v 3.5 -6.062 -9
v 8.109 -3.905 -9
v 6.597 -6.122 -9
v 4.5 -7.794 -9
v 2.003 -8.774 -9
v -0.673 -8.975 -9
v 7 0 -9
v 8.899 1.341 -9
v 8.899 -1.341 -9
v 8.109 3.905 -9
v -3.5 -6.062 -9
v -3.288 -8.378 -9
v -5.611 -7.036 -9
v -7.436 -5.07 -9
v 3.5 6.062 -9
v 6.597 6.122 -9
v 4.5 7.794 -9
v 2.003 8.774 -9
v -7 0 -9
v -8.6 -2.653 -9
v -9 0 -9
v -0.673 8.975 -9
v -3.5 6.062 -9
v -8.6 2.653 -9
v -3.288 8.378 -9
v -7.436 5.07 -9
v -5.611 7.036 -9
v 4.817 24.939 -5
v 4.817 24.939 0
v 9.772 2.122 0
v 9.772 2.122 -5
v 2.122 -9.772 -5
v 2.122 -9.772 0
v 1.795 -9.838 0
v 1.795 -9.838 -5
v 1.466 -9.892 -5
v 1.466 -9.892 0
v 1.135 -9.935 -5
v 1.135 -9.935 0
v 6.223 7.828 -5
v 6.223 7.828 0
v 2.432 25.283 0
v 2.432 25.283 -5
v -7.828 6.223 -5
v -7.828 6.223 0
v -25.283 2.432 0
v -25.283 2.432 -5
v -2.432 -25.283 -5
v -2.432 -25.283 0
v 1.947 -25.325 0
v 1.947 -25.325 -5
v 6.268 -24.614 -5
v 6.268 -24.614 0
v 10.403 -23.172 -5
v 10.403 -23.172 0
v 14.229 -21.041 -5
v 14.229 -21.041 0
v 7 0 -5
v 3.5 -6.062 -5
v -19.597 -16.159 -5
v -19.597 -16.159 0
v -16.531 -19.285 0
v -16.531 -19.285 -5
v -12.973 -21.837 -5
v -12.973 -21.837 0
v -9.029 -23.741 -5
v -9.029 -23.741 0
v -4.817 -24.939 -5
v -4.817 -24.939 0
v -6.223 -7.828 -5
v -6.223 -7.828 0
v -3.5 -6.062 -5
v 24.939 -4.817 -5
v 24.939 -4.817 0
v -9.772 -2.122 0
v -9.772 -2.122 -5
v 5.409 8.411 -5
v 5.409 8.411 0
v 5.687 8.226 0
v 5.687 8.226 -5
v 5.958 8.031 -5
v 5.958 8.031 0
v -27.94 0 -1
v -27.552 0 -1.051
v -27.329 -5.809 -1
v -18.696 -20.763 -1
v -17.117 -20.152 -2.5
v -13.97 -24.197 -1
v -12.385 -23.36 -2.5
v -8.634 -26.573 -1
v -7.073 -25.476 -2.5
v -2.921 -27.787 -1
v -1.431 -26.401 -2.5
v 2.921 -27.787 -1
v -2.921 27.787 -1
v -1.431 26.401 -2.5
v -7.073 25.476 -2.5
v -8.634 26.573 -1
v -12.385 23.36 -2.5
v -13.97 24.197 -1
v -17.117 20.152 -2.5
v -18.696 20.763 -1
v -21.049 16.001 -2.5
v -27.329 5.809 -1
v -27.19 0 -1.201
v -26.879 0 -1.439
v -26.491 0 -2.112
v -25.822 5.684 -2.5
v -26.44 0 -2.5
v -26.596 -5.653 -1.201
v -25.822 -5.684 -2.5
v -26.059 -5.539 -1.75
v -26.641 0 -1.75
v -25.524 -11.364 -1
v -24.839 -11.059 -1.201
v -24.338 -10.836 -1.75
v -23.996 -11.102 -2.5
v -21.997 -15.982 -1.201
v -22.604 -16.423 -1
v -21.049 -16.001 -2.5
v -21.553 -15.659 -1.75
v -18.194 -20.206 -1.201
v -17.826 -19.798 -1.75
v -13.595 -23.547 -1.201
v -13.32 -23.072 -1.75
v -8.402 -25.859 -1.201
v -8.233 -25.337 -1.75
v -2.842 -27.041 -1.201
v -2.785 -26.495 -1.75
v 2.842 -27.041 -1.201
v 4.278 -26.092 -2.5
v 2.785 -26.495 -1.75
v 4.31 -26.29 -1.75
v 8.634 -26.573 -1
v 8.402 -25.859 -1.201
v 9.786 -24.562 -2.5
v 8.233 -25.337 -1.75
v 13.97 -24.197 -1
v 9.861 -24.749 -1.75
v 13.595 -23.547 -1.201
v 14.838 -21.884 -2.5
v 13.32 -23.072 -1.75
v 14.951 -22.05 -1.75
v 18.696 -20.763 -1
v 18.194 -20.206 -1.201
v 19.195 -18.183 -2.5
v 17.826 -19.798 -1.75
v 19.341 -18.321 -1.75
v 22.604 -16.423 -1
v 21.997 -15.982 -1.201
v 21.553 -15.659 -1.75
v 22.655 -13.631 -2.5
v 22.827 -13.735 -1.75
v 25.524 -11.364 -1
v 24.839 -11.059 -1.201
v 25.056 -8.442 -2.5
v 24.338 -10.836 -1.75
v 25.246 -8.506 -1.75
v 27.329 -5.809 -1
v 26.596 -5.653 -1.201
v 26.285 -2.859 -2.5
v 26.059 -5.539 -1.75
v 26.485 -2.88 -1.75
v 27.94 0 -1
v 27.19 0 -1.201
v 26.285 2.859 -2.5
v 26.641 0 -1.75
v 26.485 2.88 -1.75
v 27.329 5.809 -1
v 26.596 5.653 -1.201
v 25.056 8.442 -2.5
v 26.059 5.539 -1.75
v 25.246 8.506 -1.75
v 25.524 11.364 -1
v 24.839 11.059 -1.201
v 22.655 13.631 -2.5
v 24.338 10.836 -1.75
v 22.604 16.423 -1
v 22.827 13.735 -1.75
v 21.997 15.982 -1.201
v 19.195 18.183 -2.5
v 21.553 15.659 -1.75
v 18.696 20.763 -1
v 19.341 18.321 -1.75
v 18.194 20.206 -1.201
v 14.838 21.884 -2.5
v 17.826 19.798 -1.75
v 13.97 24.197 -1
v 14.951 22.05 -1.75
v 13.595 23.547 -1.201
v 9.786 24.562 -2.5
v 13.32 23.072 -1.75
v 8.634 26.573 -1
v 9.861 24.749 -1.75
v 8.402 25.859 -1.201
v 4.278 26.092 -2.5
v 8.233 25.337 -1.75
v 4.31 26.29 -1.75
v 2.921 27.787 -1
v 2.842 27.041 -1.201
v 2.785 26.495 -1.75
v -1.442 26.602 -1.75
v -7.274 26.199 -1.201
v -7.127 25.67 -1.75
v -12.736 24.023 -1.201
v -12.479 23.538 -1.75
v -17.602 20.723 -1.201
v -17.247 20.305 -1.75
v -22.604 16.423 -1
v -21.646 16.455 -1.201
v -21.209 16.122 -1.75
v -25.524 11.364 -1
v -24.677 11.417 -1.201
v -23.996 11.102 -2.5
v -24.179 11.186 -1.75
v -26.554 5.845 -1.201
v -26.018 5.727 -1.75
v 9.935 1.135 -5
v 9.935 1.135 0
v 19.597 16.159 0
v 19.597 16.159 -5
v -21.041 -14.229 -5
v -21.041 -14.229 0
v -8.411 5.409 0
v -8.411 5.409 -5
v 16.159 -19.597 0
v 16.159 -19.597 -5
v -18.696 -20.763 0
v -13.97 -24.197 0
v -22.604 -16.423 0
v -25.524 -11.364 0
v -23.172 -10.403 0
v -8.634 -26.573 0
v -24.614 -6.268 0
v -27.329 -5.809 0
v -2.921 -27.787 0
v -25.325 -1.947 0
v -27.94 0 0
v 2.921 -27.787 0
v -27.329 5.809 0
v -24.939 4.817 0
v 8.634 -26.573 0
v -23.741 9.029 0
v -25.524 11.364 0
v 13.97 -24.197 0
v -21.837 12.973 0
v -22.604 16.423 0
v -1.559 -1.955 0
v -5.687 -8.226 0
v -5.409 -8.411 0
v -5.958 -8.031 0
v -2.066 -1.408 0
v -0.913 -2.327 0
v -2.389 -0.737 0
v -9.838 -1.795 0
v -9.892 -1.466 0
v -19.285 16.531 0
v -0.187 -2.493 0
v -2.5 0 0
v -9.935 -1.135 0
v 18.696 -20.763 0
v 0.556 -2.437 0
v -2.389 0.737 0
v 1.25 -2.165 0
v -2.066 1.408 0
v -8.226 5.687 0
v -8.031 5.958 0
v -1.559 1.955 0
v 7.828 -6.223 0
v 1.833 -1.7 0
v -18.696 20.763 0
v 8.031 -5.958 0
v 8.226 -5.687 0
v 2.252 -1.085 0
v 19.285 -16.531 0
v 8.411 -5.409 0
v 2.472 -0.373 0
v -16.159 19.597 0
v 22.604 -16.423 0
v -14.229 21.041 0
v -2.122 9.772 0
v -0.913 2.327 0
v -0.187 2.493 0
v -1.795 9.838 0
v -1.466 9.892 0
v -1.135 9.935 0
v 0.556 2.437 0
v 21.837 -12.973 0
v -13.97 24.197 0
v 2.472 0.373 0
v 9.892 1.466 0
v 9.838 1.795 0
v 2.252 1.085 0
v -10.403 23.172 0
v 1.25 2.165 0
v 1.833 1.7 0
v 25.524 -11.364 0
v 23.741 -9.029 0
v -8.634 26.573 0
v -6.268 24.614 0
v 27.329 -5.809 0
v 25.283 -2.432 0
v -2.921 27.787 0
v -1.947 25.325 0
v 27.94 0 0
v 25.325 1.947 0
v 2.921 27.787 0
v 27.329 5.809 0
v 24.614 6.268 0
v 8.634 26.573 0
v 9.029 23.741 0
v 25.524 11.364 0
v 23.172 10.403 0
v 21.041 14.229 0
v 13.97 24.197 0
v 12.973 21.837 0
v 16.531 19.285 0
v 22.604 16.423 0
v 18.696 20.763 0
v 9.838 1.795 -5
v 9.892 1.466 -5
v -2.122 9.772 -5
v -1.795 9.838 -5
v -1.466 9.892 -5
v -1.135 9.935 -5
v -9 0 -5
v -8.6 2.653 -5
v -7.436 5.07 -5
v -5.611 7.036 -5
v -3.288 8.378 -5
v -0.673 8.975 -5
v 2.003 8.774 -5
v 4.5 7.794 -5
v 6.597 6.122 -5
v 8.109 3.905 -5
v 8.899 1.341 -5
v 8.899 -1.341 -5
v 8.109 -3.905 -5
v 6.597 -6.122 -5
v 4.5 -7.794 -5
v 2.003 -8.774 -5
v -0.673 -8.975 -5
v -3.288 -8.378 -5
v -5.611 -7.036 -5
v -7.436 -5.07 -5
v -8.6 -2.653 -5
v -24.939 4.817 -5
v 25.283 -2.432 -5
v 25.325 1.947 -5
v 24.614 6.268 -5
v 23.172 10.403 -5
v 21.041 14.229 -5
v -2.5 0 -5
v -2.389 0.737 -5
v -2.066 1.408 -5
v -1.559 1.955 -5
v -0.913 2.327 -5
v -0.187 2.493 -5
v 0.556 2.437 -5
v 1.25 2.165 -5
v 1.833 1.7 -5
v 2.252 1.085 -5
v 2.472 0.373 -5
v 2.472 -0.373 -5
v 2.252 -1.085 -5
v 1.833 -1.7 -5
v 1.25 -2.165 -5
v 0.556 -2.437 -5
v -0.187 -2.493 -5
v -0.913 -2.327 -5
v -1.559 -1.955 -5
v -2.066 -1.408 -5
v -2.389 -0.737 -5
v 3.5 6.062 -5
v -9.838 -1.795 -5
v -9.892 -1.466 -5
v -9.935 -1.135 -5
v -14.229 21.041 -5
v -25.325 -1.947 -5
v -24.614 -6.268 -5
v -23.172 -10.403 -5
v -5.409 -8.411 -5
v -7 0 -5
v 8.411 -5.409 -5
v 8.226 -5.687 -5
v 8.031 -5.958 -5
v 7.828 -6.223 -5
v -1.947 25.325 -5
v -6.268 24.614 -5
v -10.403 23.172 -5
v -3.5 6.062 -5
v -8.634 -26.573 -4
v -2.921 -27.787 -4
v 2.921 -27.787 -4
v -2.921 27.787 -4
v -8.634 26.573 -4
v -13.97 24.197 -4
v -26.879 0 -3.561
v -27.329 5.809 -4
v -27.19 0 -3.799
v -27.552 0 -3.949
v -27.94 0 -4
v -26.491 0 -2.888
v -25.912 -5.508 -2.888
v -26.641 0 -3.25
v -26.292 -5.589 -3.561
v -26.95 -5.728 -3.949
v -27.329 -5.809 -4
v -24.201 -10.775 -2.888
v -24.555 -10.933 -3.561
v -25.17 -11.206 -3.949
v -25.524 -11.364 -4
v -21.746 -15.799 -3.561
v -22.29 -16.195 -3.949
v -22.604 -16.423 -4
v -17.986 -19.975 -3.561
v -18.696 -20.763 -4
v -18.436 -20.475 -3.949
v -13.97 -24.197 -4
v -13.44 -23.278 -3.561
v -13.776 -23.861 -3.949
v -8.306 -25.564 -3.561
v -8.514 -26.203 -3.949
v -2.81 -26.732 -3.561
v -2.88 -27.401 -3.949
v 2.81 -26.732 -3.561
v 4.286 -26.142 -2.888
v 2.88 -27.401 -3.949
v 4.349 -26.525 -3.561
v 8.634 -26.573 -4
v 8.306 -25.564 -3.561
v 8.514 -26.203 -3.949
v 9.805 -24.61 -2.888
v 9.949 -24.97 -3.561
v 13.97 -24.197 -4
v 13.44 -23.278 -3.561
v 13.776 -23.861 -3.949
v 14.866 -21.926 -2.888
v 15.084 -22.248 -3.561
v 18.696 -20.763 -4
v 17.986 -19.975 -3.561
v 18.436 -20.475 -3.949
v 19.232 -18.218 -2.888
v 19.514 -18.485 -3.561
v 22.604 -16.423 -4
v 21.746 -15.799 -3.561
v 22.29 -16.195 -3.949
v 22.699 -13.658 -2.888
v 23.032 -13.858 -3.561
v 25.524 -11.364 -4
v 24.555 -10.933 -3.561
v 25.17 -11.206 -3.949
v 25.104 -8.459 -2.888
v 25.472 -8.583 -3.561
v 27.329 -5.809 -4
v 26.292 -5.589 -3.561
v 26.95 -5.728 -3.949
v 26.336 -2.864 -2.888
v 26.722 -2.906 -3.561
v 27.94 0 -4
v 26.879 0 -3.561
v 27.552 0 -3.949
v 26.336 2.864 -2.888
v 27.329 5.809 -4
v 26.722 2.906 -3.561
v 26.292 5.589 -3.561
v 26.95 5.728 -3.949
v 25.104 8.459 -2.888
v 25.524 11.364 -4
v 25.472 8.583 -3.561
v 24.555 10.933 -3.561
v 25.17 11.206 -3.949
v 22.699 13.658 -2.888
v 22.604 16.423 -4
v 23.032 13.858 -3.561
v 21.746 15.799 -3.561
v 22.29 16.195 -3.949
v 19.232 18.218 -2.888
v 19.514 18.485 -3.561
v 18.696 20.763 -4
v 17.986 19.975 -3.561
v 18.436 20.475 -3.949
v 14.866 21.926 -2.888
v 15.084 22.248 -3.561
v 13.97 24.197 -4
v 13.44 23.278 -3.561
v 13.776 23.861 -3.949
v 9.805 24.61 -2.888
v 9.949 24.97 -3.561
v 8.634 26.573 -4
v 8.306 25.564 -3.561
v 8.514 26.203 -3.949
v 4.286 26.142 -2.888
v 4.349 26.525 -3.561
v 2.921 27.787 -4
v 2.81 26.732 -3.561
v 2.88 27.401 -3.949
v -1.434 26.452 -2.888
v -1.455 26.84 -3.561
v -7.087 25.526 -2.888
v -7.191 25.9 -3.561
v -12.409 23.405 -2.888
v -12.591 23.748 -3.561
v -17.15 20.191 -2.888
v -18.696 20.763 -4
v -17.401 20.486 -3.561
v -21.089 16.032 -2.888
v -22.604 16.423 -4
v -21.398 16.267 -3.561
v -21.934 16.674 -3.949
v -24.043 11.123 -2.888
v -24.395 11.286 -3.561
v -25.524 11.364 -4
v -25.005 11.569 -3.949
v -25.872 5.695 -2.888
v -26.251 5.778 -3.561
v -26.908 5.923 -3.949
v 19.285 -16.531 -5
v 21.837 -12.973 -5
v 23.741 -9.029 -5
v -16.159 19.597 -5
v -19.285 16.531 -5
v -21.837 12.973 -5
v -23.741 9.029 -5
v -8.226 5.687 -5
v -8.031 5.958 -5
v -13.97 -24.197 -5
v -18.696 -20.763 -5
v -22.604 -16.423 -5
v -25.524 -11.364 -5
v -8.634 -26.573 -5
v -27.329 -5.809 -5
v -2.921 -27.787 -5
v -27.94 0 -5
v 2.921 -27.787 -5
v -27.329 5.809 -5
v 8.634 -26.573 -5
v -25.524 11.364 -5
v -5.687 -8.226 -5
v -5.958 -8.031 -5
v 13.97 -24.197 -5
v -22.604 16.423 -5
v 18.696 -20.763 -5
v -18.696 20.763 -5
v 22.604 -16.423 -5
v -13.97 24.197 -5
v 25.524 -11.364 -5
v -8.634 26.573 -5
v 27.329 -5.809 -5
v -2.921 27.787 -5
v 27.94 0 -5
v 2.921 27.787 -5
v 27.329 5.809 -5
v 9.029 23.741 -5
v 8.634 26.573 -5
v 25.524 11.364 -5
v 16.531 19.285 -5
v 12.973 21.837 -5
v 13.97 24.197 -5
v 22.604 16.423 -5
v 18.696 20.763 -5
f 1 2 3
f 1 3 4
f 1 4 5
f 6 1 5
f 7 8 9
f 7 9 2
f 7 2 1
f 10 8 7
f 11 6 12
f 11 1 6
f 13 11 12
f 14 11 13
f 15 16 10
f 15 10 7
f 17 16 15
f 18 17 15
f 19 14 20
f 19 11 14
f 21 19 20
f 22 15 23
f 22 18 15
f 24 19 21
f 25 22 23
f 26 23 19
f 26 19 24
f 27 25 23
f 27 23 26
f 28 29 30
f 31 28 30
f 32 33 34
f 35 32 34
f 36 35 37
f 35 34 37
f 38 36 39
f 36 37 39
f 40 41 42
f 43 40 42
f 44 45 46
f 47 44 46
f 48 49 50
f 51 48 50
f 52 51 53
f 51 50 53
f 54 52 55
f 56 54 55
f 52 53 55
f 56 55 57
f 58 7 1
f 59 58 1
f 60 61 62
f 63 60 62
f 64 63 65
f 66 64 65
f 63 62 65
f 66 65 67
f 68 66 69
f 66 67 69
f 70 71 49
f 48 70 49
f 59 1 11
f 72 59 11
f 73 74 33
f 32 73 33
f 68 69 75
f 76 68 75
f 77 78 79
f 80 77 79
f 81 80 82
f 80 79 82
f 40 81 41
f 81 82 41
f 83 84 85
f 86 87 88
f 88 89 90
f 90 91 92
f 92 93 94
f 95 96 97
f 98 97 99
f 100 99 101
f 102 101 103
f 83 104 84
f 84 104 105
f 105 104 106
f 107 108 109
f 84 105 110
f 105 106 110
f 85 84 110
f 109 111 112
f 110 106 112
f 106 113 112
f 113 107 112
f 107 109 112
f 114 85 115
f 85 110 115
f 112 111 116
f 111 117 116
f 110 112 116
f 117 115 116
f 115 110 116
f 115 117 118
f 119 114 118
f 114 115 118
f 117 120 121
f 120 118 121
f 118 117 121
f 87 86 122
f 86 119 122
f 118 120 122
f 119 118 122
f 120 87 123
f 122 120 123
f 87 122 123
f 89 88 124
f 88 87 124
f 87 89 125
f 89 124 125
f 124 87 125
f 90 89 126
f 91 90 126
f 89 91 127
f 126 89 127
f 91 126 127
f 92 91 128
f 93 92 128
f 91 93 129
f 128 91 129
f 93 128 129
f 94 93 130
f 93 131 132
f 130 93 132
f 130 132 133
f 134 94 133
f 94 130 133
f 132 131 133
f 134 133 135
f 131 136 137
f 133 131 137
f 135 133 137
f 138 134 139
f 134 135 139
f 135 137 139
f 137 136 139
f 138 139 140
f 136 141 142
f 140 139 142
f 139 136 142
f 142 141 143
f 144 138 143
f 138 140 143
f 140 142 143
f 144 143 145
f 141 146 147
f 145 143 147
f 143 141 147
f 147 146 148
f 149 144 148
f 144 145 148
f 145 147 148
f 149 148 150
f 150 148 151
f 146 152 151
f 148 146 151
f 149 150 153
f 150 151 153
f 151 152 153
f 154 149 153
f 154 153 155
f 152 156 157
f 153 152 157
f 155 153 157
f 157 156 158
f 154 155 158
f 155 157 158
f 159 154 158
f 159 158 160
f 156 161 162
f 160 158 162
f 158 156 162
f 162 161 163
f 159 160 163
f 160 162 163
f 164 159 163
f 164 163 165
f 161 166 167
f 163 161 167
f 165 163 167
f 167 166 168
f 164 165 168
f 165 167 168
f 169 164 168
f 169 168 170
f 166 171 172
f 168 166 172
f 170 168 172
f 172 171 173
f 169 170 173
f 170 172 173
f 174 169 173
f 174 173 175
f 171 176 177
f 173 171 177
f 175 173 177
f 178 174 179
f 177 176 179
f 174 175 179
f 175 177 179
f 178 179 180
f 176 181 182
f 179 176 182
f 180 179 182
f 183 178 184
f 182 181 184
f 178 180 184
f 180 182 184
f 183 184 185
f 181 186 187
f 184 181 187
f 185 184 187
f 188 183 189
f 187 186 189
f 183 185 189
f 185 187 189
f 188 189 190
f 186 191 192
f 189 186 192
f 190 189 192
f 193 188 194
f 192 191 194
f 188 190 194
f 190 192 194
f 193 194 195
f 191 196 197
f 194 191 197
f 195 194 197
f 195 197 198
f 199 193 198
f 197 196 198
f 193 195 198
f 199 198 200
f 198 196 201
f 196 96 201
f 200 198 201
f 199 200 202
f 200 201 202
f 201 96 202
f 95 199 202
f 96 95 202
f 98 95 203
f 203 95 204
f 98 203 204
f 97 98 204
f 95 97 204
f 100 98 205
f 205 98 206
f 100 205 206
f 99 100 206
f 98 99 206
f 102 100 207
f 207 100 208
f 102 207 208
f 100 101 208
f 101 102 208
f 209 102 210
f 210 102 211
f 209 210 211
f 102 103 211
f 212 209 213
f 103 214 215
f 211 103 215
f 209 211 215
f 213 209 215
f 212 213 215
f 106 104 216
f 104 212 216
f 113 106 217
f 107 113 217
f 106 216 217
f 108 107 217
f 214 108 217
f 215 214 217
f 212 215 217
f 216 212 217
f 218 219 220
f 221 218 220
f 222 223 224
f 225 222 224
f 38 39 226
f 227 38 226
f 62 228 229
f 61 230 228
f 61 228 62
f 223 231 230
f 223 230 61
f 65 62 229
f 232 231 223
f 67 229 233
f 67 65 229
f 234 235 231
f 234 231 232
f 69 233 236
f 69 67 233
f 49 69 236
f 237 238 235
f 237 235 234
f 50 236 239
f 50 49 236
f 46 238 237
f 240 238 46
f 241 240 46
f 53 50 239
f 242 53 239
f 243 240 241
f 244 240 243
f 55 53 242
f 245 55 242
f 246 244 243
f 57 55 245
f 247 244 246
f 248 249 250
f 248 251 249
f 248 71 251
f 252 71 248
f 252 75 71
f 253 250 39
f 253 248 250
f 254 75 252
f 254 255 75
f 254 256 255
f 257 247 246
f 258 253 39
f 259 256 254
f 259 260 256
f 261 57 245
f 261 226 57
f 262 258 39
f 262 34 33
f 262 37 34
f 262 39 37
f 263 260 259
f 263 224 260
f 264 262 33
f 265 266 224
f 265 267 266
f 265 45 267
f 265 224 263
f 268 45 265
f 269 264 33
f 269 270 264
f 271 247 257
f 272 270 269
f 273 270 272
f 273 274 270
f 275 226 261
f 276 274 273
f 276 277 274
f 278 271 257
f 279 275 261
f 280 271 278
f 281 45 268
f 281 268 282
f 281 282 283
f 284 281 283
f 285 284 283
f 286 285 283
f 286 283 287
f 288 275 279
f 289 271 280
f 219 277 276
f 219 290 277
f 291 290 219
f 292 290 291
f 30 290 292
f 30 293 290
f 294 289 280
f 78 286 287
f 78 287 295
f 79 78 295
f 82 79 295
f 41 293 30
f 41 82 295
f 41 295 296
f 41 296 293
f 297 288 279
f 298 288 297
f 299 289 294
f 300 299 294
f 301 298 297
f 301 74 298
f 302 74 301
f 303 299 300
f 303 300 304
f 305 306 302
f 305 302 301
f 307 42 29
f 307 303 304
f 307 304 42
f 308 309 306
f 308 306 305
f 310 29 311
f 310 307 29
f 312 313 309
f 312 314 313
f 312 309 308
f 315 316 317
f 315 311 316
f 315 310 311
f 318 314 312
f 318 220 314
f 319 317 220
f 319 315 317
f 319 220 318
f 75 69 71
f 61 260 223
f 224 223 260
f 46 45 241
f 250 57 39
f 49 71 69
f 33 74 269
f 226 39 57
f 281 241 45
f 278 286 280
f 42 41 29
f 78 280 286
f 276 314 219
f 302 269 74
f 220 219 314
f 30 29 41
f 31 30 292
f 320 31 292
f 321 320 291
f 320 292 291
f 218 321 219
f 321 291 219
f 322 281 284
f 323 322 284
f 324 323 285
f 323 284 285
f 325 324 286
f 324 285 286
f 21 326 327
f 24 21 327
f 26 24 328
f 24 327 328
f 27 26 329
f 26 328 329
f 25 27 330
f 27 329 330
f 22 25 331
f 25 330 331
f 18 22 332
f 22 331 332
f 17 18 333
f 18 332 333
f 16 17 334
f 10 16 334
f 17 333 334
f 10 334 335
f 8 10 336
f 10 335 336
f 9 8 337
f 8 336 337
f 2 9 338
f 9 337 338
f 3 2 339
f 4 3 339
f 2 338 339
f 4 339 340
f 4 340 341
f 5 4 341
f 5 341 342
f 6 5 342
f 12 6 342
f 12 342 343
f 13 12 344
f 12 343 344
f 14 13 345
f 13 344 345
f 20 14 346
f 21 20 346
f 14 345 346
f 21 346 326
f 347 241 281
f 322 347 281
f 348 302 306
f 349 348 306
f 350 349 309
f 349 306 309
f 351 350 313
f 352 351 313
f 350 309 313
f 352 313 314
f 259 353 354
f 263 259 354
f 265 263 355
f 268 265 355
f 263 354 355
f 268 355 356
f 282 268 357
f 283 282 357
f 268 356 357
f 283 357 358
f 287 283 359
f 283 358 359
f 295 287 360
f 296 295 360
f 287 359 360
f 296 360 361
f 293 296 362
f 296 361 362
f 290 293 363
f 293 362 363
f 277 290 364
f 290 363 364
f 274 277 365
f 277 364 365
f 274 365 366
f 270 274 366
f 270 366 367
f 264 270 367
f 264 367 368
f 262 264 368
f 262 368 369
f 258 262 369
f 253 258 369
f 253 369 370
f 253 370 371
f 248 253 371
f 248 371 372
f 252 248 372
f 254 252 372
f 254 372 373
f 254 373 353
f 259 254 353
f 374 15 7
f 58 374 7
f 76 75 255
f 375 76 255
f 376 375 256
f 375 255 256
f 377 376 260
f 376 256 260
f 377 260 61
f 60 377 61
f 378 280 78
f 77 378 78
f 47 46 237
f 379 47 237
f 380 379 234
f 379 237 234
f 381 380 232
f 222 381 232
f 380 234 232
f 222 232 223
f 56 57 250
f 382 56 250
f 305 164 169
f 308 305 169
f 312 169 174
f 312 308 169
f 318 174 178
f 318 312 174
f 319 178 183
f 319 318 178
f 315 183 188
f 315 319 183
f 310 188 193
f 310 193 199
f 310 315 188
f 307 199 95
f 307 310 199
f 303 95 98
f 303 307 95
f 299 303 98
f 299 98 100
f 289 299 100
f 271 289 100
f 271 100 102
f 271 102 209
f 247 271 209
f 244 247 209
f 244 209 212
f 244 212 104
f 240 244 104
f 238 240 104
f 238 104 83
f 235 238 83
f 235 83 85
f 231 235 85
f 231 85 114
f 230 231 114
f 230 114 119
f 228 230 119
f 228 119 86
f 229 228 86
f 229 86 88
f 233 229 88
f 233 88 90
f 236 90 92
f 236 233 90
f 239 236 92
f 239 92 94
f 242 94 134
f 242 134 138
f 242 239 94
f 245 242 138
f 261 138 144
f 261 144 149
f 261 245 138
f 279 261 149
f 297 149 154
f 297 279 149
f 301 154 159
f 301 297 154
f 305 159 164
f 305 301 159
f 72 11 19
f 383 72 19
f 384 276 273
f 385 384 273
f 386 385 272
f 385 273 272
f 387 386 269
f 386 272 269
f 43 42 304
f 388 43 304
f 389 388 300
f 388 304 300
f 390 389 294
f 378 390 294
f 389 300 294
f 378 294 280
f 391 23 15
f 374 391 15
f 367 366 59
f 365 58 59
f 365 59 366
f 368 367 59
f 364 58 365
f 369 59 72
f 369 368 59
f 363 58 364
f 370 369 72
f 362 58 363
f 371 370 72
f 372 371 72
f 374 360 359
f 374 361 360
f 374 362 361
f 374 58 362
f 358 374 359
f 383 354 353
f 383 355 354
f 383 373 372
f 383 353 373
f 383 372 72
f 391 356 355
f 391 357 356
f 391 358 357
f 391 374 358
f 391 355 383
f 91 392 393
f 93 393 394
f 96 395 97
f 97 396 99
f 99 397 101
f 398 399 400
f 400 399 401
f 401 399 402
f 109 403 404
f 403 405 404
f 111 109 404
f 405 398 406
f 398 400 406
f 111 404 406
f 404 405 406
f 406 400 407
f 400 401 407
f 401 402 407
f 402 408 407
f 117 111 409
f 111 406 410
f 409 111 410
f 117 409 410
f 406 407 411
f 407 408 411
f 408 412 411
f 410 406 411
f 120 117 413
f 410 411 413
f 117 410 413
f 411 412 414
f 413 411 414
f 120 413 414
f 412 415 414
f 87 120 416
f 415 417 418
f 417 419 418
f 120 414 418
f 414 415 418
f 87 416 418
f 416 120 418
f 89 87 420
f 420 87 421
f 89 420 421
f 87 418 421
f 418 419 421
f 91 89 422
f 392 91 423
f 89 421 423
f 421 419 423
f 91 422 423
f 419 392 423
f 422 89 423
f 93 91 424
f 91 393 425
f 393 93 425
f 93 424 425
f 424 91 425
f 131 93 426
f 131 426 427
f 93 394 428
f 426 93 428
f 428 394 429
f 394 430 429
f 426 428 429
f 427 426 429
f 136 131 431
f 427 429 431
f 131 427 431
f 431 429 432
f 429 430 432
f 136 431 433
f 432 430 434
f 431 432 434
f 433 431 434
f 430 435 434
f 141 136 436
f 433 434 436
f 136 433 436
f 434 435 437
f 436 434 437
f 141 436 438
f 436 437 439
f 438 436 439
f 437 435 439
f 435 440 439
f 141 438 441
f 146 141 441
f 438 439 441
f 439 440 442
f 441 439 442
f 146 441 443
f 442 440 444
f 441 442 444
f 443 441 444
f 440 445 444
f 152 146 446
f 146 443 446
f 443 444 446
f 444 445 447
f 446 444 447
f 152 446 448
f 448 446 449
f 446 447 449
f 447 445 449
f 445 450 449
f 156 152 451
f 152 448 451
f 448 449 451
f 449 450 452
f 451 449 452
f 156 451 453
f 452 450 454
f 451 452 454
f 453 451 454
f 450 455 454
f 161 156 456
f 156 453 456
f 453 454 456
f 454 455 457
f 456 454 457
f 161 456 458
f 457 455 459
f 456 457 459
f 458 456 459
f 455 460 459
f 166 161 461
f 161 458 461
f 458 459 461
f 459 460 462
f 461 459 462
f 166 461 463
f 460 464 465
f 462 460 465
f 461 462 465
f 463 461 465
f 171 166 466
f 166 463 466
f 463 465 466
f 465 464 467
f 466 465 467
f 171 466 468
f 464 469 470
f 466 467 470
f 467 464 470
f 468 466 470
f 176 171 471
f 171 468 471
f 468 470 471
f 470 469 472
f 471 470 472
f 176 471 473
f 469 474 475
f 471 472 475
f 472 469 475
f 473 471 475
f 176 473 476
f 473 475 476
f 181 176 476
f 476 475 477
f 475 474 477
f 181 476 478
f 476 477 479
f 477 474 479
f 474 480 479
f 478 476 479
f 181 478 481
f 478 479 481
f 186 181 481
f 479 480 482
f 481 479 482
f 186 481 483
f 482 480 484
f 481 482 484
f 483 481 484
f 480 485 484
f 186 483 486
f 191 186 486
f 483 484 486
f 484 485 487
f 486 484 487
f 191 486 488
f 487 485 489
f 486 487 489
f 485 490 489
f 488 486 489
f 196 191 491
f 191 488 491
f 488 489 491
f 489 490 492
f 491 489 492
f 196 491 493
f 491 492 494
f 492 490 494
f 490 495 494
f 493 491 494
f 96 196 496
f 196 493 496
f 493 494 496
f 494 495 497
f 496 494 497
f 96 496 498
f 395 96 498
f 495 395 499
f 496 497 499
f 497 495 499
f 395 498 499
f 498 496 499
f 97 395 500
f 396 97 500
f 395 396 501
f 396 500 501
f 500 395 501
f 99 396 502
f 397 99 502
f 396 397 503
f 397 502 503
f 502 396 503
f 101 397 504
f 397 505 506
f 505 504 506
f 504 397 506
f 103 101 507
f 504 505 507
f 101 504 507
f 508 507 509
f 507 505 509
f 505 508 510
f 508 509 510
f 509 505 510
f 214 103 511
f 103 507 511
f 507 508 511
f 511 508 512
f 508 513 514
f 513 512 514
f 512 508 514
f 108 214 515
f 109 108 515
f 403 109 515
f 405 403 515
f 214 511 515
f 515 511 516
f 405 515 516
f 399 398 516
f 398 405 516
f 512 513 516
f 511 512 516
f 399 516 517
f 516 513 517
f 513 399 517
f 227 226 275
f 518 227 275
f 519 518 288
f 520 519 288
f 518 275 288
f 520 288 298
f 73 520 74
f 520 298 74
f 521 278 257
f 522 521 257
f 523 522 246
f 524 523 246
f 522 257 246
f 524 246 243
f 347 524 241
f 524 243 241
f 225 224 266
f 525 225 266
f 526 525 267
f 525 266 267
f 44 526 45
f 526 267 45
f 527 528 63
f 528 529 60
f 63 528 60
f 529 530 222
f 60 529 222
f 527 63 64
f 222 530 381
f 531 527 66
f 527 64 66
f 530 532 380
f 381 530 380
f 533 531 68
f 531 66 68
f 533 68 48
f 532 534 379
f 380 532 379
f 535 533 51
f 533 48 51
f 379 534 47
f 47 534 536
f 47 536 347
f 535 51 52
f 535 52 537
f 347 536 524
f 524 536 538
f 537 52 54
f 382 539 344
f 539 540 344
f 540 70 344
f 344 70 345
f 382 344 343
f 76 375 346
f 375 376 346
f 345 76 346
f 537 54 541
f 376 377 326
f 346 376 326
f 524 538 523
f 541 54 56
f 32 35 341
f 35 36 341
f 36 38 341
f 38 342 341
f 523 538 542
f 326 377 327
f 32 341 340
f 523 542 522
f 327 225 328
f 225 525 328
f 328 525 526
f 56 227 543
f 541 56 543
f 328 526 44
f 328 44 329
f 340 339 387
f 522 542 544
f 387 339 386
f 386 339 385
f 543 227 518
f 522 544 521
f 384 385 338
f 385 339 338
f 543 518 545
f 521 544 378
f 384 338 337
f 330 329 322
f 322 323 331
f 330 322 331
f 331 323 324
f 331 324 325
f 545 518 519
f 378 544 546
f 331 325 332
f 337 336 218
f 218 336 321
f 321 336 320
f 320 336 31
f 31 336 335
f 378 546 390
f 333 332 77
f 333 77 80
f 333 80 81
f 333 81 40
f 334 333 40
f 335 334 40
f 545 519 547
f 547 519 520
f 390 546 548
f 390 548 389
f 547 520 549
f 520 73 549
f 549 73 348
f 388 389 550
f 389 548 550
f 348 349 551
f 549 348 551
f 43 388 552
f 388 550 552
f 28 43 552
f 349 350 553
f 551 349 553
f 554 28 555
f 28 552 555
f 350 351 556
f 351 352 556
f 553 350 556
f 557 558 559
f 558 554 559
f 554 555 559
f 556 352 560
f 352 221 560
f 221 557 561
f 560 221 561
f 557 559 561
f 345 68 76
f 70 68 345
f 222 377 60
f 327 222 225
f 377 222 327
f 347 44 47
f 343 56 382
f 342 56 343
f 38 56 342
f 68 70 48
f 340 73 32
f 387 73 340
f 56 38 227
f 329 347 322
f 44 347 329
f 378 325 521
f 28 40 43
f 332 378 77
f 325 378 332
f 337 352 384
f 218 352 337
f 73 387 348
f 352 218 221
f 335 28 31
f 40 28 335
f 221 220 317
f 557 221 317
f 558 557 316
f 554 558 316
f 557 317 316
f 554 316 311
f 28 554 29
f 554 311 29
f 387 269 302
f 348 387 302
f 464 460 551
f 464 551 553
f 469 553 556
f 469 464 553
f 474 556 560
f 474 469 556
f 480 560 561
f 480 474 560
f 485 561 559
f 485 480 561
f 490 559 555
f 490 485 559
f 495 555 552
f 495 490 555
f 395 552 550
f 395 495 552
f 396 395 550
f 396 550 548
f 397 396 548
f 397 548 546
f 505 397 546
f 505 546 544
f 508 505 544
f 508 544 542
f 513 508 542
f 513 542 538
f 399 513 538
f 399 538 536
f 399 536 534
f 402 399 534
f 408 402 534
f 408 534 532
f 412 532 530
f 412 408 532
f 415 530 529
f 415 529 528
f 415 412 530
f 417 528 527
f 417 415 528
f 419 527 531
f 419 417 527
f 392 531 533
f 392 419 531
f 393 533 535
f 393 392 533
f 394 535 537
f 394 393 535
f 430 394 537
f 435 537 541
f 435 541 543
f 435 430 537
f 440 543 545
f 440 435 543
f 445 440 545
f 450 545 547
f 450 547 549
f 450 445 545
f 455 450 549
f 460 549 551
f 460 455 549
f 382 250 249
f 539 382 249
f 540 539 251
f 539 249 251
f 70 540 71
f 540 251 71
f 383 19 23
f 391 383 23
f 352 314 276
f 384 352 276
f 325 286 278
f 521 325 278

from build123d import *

# Parameters (mm, degrees)
SKETCH1_R           = 27.94
BOSS_EXTRUDE1_DEPTH = 5
CUT_EXTRUDE2_DEPTH  = 5
SKETCH9_R           = 1.5
SKETCH10_R          = 9
BOSS_EXTRUDE2_DEPTH = 4
CUT_EXTRUDE4_DEPTH  = 4
SKETCH12_R          = 2.5
CUT_EXTRUDE5_DEPTH  = 6


with BuildPart() as part:
    # Sketch1 → Boss-Extrude1 (new body)
    with BuildSketch(Plane.XY):
        Circle(SKETCH1_R)
    extrude(amount=-BOSS_EXTRUDE1_DEPTH)

    # Sketch7 → Cut-Extrude2 (cut)
    with BuildSketch(Plane.XY):
        with BuildLine():
            ThreePointArc((2.122364529, -9.772183421), (1.630852156, -9.866119868), (1.135255991, -9.935350715))
            Line((1.135255991, -9.935350715), (16.158618381, -19.597424627))
            ThreePointArc((16.158618381, -19.597424627), (21.837418082, -12.972554549), (24.939104938, -4.816746297))
            Line((24.939104938, -4.816746297), (2.122364529, -9.772183421))
        make_face()
        with BuildLine():
            Line((14.228656248, -21.040564188), (-5.409238814, -8.410715514))
            ThreePointArc((-5.409238814, -8.410715514), (-5.823213644, -8.129586881), (-6.222606654, -7.828101074))
            Line((-6.222606654, -7.828101074), (-2.431603216, -25.283340479))
            ThreePointArc((-2.431603216, -25.283340479), (6.268405118, -24.6143677), (14.228656248, -21.040564188))
        make_face()
        with BuildLine():
            ThreePointArc((8.410715514, -5.409238814), (8.129586881, -5.823213644), (7.828101074, -6.222606654))
            Line((7.828101074, -6.222606654), (25.283340479, -2.431603216))
            ThreePointArc((25.283340479, -2.431603216), (24.6143677, 6.268405118), (21.040564188, 14.228656248))
            Line((21.040564188, 14.228656248), (8.410715514, -5.409238814))
        make_face()
        with BuildLine():
            Line((-4.816746297, -24.939104938), (-9.772183421, -2.122364529))
            ThreePointArc((-9.772183421, -2.122364529), (-9.866119868, -1.630852156), (-9.935350715, -1.135255991))
            Line((-9.935350715, -1.135255991), (-19.597424627, -16.158618381))
            ThreePointArc((-19.597424627, -16.158618381), (-12.972554549, -21.837418082), (-4.816746297, -24.939104938))
        make_face()
        with BuildLine():
            Line((-21.040564188, -14.228656248), (-8.410715514, 5.409238814))
            ThreePointArc((-8.410715514, 5.409238814), (-8.129586881, 5.823213644), (-7.828101074, 6.222606654))
            Line((-7.828101074, 6.222606654), (-25.283340479, 2.431603216))
            ThreePointArc((-25.283340479, 2.431603216), (-24.6143677, -6.268405118), (-21.040564188, -14.228656248))
        make_face()
        with BuildLine():
            Line((9.935350715, 1.135255991), (19.597424627, 16.158618381))
            ThreePointArc((19.597424627, 16.158618381), (12.972554549, 21.837418082), (4.816746297, 24.939104938))
            Line((4.816746297, 24.939104938), (9.772183421, 2.122364529))
            ThreePointArc((9.772183421, 2.122364529), (9.866119868, 1.630852156), (9.935350715, 1.135255991))
        make_face()
        with BuildLine():
            Line((-24.939104938, 4.816746297), (-2.122364529, 9.772183421))
            ThreePointArc((-2.122364529, 9.772183421), (-1.630852156, 9.866119868), (-1.135255991, 9.935350715))
            Line((-1.135255991, 9.935350715), (-16.158618381, 19.597424627))
            ThreePointArc((-16.158618381, 19.597424627), (-21.837418082, 12.972554549), (-24.939104938, 4.816746297))
        make_face()
        with BuildLine():
            Line((6.222606654, 7.828101074), (2.431603216, 25.283340479))
            ThreePointArc((2.431603216, 25.283340479), (-6.268405118, 24.6143677), (-14.228656248, 21.040564188))
            Line((-14.228656248, 21.040564188), (5.409238814, 8.410715514))
            ThreePointArc((5.409238814, 8.410715514), (5.823213644, 8.129586881), (6.222606654, 7.828101074))
        make_face()
    extrude(amount=-CUT_EXTRUDE2_DEPTH, mode=Mode.SUBTRACT)

    # Sketch9 → Cut-Revolve3 (revolve, cut)
    with BuildSketch(Plane(origin=(0, 0, 0), x_dir=(1, 0, 0), z_dir=(0, 1, 0))):
        with Locations((-27.94, 2.5)):
            Circle(SKETCH9_R)
    revolve(axis=Axis((0, 0, -92.148103423), (0, 0, 1)), mode=Mode.SUBTRACT)

    # Sketch10 → Boss-Extrude2 (add)
    with BuildSketch(Plane(origin=(0, 0, -5), x_dir=(-1, 0, 0), z_dir=(0, 0, -1))):
        Circle(SKETCH10_R)
    extrude(amount=BOSS_EXTRUDE2_DEPTH)

    # Sketch11 → Cut-Extrude4 (cut)
    with BuildSketch(Plane(origin=(0, 0, -9), x_dir=(-1, 0, 0), z_dir=(0, 0, -1))):
        Polygon((7, 0), (3.5, 6.062177826), (-3.5, 6.062177826), (-7, 0), (-3.5, -6.062177826), (3.5, -6.062177826), align=None)
    extrude(amount=-CUT_EXTRUDE4_DEPTH, mode=Mode.SUBTRACT)

    # Sketch12 → Cut-Extrude5 (cut, through all)
    with BuildSketch(Plane(origin=(0, 0, -5), x_dir=(-1, 0, 0), z_dir=(0, 0, -1))):
        Circle(SKETCH12_R)
    extrude(amount=-CUT_EXTRUDE5_DEPTH, mode=Mode.SUBTRACT)


solid = part.part
